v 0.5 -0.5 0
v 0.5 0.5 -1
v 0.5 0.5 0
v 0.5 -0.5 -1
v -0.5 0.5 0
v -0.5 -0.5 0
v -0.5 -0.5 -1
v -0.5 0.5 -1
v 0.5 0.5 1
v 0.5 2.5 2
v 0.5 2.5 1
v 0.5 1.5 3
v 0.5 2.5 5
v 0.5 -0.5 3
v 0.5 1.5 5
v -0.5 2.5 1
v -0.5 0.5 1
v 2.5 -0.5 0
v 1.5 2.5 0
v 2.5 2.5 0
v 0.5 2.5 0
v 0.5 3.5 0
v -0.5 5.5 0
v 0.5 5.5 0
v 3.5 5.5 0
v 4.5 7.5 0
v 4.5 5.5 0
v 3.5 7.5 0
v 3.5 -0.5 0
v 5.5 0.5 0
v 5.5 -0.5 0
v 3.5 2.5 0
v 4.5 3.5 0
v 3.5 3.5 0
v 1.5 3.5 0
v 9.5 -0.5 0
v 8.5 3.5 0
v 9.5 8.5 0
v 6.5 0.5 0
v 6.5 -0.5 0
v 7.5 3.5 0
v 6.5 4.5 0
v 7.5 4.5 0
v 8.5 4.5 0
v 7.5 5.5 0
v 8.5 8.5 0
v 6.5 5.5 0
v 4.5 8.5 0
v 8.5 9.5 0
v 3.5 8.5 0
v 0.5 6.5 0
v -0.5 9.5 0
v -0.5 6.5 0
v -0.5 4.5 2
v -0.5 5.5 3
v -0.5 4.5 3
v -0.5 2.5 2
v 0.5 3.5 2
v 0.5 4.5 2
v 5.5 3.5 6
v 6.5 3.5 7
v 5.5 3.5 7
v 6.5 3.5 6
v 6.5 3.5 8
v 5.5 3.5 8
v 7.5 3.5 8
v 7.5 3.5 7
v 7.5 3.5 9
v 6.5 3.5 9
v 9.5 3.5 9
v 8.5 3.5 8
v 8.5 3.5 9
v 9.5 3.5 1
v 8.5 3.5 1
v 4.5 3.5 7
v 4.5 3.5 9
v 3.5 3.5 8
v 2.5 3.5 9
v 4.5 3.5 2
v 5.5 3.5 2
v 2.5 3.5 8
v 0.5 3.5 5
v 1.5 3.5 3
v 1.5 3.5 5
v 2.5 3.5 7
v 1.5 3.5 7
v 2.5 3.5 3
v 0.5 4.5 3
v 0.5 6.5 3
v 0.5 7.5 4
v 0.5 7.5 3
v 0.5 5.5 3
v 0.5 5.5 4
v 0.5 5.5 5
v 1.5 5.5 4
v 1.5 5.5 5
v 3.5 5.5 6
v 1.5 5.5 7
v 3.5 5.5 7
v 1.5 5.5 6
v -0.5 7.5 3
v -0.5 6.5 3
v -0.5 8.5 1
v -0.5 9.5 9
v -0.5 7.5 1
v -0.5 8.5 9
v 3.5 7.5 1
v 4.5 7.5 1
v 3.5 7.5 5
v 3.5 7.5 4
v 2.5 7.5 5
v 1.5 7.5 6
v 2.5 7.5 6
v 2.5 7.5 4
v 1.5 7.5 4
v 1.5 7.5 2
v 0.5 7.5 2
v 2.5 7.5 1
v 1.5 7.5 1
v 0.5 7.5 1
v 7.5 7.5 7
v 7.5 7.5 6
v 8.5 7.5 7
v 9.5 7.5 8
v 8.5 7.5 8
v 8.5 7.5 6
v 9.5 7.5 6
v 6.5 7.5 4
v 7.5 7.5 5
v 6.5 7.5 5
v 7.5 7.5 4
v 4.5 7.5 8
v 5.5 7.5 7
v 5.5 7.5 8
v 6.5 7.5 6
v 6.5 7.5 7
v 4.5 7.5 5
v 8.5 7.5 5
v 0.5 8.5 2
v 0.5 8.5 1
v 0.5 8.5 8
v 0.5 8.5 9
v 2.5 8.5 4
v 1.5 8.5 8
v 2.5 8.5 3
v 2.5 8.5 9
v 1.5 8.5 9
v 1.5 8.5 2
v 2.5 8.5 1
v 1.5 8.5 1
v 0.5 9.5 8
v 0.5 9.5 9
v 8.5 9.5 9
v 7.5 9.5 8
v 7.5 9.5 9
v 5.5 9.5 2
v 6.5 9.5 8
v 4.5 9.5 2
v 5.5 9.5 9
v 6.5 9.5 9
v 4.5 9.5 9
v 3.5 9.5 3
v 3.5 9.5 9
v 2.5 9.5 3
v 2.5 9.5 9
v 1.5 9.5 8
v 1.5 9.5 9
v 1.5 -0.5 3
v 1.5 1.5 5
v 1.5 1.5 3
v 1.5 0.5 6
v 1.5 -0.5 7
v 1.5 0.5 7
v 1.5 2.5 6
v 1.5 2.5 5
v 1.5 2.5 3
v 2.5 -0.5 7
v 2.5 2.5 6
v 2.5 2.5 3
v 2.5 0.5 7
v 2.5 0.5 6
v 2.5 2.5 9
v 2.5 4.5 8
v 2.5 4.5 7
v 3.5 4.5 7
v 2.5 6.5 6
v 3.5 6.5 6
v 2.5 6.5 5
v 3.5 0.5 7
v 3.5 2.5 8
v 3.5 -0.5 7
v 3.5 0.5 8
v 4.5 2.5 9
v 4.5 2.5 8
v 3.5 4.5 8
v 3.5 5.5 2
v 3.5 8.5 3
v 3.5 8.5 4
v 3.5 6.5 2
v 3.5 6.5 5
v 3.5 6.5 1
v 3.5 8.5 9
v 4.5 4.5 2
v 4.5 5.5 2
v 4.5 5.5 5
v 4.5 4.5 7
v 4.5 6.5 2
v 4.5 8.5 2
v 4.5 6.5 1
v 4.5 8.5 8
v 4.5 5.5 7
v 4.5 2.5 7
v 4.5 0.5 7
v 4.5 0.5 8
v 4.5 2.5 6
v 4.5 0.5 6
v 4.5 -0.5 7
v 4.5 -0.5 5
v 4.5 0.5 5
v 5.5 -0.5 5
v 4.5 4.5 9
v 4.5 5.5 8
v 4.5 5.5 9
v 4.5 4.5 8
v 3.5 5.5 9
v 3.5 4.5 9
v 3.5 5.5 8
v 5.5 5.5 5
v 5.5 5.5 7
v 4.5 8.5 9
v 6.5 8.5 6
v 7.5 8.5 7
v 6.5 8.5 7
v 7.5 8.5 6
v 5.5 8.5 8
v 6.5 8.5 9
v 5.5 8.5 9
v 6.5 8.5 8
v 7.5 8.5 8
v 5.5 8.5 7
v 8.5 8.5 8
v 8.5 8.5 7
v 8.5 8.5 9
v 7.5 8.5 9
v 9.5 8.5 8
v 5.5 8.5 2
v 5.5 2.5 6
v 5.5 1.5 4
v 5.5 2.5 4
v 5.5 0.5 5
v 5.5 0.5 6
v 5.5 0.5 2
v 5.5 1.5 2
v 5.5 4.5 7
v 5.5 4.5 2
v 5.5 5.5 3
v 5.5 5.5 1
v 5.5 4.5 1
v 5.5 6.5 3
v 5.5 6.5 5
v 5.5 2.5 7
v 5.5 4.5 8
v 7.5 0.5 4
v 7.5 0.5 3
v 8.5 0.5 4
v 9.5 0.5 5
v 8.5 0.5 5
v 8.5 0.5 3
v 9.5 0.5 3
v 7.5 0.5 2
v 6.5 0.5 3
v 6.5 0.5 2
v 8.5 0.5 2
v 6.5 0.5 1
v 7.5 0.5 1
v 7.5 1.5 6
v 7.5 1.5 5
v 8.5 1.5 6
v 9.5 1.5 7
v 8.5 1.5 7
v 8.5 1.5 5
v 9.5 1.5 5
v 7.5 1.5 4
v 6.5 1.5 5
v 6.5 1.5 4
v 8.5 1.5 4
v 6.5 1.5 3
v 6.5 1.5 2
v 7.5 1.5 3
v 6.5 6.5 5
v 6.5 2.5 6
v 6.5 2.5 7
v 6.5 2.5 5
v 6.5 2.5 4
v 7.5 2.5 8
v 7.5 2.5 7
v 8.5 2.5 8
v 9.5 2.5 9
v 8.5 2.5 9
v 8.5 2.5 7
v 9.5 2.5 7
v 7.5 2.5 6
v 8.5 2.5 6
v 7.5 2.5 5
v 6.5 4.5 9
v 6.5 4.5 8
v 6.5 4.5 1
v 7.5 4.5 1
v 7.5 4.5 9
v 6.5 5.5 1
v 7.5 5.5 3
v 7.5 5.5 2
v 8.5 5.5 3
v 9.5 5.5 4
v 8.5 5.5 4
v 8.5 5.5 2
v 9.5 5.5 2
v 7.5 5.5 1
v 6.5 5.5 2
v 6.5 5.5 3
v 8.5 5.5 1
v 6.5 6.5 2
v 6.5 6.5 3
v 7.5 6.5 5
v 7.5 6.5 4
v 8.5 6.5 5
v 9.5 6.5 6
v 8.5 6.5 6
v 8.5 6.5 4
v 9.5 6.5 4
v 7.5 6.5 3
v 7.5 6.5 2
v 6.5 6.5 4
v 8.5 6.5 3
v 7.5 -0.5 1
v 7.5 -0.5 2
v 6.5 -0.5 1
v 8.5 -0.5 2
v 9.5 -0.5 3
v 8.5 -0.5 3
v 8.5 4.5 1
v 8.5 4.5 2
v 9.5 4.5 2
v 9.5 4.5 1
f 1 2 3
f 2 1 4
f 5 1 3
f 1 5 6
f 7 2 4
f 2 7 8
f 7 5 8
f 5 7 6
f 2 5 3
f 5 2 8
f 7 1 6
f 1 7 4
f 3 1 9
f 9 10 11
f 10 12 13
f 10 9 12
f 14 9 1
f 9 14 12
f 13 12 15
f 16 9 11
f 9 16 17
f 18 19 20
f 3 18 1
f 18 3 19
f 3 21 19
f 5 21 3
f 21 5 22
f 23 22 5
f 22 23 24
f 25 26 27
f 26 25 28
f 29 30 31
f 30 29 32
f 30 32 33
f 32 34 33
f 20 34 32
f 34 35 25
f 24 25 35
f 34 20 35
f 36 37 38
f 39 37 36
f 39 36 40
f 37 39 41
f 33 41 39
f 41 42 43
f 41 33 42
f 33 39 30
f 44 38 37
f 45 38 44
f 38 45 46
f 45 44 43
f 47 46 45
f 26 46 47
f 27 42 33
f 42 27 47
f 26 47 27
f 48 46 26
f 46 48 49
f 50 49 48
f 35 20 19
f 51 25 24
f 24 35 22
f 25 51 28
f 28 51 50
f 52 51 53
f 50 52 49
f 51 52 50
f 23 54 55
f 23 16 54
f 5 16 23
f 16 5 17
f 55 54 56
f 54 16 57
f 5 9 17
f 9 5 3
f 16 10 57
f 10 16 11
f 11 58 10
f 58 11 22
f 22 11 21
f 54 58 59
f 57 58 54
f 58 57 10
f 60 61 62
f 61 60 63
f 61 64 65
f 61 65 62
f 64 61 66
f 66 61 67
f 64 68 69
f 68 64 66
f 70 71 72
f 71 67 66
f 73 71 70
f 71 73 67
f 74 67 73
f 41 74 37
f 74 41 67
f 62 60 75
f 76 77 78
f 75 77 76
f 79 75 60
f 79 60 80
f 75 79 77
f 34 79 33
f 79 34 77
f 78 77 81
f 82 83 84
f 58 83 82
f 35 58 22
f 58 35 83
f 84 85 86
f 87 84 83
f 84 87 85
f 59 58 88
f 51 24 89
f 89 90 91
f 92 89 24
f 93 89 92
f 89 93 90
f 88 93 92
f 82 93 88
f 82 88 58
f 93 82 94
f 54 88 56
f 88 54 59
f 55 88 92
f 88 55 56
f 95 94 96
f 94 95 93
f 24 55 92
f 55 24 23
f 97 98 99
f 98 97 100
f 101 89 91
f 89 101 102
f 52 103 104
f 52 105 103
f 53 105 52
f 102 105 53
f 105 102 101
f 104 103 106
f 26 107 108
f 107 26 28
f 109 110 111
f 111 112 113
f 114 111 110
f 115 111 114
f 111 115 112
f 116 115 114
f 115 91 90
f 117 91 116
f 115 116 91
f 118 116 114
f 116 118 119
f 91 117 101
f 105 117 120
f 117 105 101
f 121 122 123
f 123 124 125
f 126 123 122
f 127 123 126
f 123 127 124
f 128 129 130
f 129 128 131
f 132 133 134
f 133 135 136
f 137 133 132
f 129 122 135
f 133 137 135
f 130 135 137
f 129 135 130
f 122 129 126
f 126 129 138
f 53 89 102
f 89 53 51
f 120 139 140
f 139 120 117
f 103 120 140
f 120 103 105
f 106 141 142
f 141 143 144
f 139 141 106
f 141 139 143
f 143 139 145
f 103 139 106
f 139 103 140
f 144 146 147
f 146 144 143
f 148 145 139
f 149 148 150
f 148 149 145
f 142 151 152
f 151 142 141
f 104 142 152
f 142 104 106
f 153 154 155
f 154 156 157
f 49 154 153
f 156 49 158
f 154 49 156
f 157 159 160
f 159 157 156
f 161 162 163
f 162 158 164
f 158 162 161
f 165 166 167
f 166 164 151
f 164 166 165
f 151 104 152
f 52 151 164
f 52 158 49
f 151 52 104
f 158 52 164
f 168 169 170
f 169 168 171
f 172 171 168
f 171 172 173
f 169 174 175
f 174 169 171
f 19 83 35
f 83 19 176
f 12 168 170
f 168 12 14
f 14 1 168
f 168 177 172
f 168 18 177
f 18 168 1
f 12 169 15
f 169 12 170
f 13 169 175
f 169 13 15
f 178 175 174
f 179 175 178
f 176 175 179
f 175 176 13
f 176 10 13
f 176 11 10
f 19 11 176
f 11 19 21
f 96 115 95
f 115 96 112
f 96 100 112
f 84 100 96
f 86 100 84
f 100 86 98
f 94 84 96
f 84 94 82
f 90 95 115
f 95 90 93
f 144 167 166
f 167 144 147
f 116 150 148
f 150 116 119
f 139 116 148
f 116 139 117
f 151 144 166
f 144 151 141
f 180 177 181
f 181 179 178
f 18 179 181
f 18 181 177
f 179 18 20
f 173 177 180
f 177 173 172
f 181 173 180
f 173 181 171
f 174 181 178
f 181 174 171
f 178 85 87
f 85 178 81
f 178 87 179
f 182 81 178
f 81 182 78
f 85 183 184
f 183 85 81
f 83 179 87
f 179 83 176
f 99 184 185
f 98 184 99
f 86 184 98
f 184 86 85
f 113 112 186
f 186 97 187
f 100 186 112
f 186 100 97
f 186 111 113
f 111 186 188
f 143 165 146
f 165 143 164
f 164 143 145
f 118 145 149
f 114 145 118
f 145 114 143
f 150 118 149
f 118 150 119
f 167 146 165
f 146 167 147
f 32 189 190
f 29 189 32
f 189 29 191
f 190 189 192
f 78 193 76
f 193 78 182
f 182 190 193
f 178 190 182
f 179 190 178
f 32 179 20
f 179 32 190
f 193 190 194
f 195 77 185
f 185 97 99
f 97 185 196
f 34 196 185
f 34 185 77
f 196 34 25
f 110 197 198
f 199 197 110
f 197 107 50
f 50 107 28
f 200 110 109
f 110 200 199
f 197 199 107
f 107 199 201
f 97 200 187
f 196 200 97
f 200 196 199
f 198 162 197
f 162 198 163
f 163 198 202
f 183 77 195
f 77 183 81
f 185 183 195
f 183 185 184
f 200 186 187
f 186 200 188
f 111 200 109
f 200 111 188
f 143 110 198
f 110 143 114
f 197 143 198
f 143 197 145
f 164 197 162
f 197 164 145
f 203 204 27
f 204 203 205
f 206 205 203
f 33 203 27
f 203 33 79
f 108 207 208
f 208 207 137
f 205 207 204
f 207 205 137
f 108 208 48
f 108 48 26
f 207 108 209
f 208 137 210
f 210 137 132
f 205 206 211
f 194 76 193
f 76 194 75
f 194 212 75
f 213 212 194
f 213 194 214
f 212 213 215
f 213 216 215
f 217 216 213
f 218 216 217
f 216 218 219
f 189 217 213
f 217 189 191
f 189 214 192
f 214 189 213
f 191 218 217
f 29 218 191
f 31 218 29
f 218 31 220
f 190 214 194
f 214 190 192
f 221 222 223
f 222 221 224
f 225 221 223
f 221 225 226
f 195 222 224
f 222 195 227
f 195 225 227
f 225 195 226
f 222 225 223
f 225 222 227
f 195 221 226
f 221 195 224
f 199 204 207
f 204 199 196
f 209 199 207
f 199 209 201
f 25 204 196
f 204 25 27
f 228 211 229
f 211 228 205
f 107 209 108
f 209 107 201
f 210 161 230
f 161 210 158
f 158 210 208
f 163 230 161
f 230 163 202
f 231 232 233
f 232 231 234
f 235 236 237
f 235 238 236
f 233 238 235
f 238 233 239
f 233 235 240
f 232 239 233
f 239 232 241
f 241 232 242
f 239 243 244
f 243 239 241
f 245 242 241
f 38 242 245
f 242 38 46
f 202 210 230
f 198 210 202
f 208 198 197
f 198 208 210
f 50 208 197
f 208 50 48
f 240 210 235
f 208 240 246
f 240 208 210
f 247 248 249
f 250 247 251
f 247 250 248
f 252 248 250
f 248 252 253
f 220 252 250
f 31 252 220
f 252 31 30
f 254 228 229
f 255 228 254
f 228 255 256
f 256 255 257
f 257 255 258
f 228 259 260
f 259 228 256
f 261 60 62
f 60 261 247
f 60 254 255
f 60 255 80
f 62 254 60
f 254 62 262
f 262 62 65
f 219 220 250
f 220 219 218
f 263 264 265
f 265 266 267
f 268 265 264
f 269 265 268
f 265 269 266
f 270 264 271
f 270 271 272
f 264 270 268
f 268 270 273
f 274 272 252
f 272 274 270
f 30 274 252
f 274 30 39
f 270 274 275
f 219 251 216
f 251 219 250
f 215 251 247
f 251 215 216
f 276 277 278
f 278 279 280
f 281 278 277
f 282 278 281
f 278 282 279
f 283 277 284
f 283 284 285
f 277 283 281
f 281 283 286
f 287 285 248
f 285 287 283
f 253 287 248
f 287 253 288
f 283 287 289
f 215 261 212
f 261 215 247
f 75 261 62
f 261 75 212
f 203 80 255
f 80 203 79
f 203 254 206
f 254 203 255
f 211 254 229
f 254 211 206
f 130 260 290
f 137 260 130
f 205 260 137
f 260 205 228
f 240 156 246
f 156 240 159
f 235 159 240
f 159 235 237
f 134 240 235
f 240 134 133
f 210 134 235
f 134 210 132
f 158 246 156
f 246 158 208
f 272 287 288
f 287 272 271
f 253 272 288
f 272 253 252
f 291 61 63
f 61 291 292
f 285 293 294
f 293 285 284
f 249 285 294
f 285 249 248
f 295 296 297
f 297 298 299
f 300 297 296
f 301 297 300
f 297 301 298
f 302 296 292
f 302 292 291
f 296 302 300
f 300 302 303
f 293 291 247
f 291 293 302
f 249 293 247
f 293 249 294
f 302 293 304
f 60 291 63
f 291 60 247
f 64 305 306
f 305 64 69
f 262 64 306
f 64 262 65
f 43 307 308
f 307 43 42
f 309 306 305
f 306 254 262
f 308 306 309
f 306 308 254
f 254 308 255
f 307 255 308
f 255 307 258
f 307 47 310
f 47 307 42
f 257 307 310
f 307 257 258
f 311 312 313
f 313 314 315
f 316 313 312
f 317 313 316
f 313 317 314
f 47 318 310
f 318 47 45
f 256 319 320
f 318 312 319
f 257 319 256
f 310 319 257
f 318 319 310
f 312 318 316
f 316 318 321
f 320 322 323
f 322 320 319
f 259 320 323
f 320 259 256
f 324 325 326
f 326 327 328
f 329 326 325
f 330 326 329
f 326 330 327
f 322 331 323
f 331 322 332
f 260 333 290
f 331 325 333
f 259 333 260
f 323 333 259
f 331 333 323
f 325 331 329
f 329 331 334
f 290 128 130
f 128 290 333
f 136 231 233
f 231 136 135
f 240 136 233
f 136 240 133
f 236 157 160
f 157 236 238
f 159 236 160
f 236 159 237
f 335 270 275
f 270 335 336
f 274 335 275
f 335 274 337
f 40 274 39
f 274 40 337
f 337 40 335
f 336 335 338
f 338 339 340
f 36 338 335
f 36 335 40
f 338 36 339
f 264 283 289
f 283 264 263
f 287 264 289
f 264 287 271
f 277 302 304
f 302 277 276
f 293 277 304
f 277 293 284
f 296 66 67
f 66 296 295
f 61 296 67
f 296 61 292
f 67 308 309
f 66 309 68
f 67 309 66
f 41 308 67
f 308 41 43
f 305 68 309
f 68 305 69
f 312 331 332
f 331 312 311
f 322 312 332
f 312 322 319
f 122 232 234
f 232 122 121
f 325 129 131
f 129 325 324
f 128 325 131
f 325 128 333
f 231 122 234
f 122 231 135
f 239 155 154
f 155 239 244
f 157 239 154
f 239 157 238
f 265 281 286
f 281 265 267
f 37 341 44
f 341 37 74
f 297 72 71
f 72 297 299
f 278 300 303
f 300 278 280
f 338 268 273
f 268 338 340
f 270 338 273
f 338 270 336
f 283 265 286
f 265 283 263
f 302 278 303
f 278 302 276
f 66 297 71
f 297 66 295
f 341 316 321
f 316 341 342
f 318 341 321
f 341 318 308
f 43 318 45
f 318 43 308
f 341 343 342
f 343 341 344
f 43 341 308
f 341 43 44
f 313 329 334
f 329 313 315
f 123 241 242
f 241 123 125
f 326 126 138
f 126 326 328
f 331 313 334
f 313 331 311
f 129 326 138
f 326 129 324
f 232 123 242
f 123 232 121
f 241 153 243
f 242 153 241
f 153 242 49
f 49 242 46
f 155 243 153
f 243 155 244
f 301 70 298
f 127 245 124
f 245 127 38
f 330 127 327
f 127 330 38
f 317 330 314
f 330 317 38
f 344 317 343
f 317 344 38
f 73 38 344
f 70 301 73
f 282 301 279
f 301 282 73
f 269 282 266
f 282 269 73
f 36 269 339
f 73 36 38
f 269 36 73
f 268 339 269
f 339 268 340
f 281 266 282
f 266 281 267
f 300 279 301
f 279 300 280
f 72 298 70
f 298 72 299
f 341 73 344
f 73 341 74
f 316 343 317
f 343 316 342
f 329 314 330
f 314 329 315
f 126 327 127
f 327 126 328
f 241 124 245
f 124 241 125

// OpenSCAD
union() {
    translate([0, 0, -0.5]) color([1, 0, 0]) cube([1, 1, 1], center=true);
    translate([0, 1, 0.5]) cube([1, 1, 1], center=true);
    translate([0, 2, 0.5]) cube([1, 1, 1], center=true);
    translate([0, 3, 1.0]) cube([1, 1, 2], center=true);
    translate([0, 4, 1.0]) cube([1, 1, 2], center=true);
    translate([0, 5, 1.5]) cube([1, 1, 3], center=true);
    translate([0, 7, 1.5]) cube([1, 1, 3], center=true);
    translate([0, 8, 0.5]) cube([1, 1, 1], center=true);
    translate([0, 9, 4.5]) cube([1, 1, 9], center=true);
    translate([1, 0, 1.5]) cube([1, 1, 3], center=true);
    translate([1, 1, 1.5]) cube([1, 1, 3], center=true);
    translate([1, 2, 2.5]) cube([1, 1, 5], center=true);
    translate([1, 4, 2.5]) cube([1, 1, 5], center=true);
    translate([1, 5, 2.5]) cube([1, 1, 5], center=true);
    translate([1, 6, 2.0]) cube([1, 1, 4], center=true);
    translate([1, 7, 2.0]) cube([1, 1, 4], center=true);
    translate([1, 8, 1.0]) cube([1, 1, 2], center=true);
    translate([1, 9, 4.0]) cube([1, 1, 8], center=true);
    translate([2, 0, 3.5]) cube([1, 1, 7], center=true);
    translate([2, 1, 3.0]) cube([1, 1, 6], center=true);
    translate([2, 2, 3.0]) cube([1, 1, 6], center=true);
    translate([2, 3, 1.5]) cube([1, 1, 3], center=true);
    translate([2, 4, 3.5]) cube([1, 1, 7], center=true);
    translate([2, 5, 3.5]) cube([1, 1, 7], center=true);
    translate([2, 6, 3.0]) cube([1, 1, 6], center=true);
    translate([2, 7, 3.0]) cube([1, 1, 6], center=true);
    translate([2, 8, 0.5]) cube([1, 1, 1], center=true);
    translate([2, 9, 4.5]) cube([1, 1, 9], center=true);
    translate([3, 3, 4.5]) cube([1, 1, 9], center=true);
    translate([3, 4, 4.0]) cube([1, 1, 8], center=true);
    translate([3, 5, 3.5]) cube([1, 1, 7], center=true);
    translate([3, 6, 3.0]) cube([1, 1, 6], center=true);
    translate([3, 7, 2.5]) cube([1, 1, 5], center=true);
    translate([3, 8, 2.0]) cube([1, 1, 4], center=true);
    translate([3, 9, 1.5]) cube([1, 1, 3], center=true);
    translate([4, 0, 3.5]) cube([1, 1, 7], center=true);
    translate([4, 1, 4.0]) cube([1, 1, 8], center=true);
    translate([4, 2, 4.0]) cube([1, 1, 8], center=true);
    translate([4, 3, 4.5]) cube([1, 1, 9], center=true);
    translate([4, 5, 8.5]) color([0, 0, 1]) cube([1, 1, 1], center=true);
    translate([4, 6, 1.0]) cube([1, 1, 2], center=true);
    translate([4, 7, 0.5]) cube([1, 1, 1], center=true);
    translate([4, 9, 4.5]) cube([1, 1, 9], center=true);
    translate([5, 0, 2.5]) cube([1, 1, 5], center=true);
    translate([5, 1, 3.0]) cube([1, 1, 6], center=true);
    translate([5, 2, 3.0]) cube([1, 1, 6], center=true);
    translate([5, 3, 3.5]) cube([1, 1, 7], center=true);
    translate([5, 4, 1.0]) cube([1, 1, 2], center=true);
    translate([5, 5, 3.5]) cube([1, 1, 7], center=true);
    translate([5, 6, 2.5]) cube([1, 1, 5], center=true);
    translate([5, 7, 2.5]) cube([1, 1, 5], center=true);
    translate([5, 8, 4.0]) cube([1, 1, 8], center=true);
    translate([5, 9, 1.0]) cube([1, 1, 2], center=true);
    translate([6, 1, 1.0]) cube([1, 1, 2], center=true);
    translate([6, 2, 2.0]) cube([1, 1, 4], center=true);
    translate([6, 3, 3.0]) cube([1, 1, 6], center=true);
    translate([6, 4, 4.0]) cube([1, 1, 8], center=true);
    translate([6, 5, 0.5]) cube([1, 1, 1], center=true);
    translate([6, 6, 1.5]) cube([1, 1, 3], center=true);
    translate([6, 7, 2.5]) cube([1, 1, 5], center=true);
    translate([6, 8, 3.5]) cube([1, 1, 7], center=true);
    translate([6, 9, 4.5]) cube([1, 1, 9], center=true);
    translate([7, 0, 0.5]) cube([1, 1, 1], center=true);
    translate([7, 1, 1.5]) cube([1, 1, 3], center=true);
    translate([7, 2, 2.5]) cube([1, 1, 5], center=true);
    translate([7, 3, 3.5]) cube([1, 1, 7], center=true);
    translate([7, 4, 4.5]) cube([1, 1, 9], center=true);
    translate([7, 6, 1.0]) cube([1, 1, 2], center=true);
    translate([7, 7, 2.0]) cube([1, 1, 4], center=true);
    translate([7, 8, 3.0]) cube([1, 1, 6], center=true);
    translate([7, 9, 4.0]) cube([1, 1, 8], center=true);
    translate([8, 0, 1.0]) cube([1, 1, 2], center=true);
    translate([8, 1, 2.0]) cube([1, 1, 4], center=true);
    translate([8, 2, 3.0]) cube([1, 1, 6], center=true);
    translate([8, 3, 4.0]) cube([1, 1, 8], center=true);
    translate([8, 5, 0.5]) cube([1, 1, 1], center=true);
    translate([8, 6, 1.5]) cube([1, 1, 3], center=true);
    translate([8, 7, 2.5]) cube([1, 1, 5], center=true);
    translate([8, 8, 3.5]) cube([1, 1, 7], center=true);
    translate([8, 9, 4.5]) cube([1, 1, 9], center=true);
    translate([9, 0, 1.5]) cube([1, 1, 3], center=true);
    translate([9, 1, 2.5]) cube([1, 1, 5], center=true);
    translate([9, 2, 3.5]) cube([1, 1, 7], center=true);
    translate([9, 3, 4.5]) cube([1, 1, 9], center=true);
    translate([9, 4, 0.5]) cube([1, 1, 1], center=true);
    translate([9, 5, 1.0]) cube([1, 1, 2], center=true);
    translate([9, 6, 2.0]) cube([1, 1, 4], center=true);
    translate([9, 7, 3.0]) cube([1, 1, 6], center=true);
    translate([9, 8, 4.0]) cube([1, 1, 8], center=true);
}
